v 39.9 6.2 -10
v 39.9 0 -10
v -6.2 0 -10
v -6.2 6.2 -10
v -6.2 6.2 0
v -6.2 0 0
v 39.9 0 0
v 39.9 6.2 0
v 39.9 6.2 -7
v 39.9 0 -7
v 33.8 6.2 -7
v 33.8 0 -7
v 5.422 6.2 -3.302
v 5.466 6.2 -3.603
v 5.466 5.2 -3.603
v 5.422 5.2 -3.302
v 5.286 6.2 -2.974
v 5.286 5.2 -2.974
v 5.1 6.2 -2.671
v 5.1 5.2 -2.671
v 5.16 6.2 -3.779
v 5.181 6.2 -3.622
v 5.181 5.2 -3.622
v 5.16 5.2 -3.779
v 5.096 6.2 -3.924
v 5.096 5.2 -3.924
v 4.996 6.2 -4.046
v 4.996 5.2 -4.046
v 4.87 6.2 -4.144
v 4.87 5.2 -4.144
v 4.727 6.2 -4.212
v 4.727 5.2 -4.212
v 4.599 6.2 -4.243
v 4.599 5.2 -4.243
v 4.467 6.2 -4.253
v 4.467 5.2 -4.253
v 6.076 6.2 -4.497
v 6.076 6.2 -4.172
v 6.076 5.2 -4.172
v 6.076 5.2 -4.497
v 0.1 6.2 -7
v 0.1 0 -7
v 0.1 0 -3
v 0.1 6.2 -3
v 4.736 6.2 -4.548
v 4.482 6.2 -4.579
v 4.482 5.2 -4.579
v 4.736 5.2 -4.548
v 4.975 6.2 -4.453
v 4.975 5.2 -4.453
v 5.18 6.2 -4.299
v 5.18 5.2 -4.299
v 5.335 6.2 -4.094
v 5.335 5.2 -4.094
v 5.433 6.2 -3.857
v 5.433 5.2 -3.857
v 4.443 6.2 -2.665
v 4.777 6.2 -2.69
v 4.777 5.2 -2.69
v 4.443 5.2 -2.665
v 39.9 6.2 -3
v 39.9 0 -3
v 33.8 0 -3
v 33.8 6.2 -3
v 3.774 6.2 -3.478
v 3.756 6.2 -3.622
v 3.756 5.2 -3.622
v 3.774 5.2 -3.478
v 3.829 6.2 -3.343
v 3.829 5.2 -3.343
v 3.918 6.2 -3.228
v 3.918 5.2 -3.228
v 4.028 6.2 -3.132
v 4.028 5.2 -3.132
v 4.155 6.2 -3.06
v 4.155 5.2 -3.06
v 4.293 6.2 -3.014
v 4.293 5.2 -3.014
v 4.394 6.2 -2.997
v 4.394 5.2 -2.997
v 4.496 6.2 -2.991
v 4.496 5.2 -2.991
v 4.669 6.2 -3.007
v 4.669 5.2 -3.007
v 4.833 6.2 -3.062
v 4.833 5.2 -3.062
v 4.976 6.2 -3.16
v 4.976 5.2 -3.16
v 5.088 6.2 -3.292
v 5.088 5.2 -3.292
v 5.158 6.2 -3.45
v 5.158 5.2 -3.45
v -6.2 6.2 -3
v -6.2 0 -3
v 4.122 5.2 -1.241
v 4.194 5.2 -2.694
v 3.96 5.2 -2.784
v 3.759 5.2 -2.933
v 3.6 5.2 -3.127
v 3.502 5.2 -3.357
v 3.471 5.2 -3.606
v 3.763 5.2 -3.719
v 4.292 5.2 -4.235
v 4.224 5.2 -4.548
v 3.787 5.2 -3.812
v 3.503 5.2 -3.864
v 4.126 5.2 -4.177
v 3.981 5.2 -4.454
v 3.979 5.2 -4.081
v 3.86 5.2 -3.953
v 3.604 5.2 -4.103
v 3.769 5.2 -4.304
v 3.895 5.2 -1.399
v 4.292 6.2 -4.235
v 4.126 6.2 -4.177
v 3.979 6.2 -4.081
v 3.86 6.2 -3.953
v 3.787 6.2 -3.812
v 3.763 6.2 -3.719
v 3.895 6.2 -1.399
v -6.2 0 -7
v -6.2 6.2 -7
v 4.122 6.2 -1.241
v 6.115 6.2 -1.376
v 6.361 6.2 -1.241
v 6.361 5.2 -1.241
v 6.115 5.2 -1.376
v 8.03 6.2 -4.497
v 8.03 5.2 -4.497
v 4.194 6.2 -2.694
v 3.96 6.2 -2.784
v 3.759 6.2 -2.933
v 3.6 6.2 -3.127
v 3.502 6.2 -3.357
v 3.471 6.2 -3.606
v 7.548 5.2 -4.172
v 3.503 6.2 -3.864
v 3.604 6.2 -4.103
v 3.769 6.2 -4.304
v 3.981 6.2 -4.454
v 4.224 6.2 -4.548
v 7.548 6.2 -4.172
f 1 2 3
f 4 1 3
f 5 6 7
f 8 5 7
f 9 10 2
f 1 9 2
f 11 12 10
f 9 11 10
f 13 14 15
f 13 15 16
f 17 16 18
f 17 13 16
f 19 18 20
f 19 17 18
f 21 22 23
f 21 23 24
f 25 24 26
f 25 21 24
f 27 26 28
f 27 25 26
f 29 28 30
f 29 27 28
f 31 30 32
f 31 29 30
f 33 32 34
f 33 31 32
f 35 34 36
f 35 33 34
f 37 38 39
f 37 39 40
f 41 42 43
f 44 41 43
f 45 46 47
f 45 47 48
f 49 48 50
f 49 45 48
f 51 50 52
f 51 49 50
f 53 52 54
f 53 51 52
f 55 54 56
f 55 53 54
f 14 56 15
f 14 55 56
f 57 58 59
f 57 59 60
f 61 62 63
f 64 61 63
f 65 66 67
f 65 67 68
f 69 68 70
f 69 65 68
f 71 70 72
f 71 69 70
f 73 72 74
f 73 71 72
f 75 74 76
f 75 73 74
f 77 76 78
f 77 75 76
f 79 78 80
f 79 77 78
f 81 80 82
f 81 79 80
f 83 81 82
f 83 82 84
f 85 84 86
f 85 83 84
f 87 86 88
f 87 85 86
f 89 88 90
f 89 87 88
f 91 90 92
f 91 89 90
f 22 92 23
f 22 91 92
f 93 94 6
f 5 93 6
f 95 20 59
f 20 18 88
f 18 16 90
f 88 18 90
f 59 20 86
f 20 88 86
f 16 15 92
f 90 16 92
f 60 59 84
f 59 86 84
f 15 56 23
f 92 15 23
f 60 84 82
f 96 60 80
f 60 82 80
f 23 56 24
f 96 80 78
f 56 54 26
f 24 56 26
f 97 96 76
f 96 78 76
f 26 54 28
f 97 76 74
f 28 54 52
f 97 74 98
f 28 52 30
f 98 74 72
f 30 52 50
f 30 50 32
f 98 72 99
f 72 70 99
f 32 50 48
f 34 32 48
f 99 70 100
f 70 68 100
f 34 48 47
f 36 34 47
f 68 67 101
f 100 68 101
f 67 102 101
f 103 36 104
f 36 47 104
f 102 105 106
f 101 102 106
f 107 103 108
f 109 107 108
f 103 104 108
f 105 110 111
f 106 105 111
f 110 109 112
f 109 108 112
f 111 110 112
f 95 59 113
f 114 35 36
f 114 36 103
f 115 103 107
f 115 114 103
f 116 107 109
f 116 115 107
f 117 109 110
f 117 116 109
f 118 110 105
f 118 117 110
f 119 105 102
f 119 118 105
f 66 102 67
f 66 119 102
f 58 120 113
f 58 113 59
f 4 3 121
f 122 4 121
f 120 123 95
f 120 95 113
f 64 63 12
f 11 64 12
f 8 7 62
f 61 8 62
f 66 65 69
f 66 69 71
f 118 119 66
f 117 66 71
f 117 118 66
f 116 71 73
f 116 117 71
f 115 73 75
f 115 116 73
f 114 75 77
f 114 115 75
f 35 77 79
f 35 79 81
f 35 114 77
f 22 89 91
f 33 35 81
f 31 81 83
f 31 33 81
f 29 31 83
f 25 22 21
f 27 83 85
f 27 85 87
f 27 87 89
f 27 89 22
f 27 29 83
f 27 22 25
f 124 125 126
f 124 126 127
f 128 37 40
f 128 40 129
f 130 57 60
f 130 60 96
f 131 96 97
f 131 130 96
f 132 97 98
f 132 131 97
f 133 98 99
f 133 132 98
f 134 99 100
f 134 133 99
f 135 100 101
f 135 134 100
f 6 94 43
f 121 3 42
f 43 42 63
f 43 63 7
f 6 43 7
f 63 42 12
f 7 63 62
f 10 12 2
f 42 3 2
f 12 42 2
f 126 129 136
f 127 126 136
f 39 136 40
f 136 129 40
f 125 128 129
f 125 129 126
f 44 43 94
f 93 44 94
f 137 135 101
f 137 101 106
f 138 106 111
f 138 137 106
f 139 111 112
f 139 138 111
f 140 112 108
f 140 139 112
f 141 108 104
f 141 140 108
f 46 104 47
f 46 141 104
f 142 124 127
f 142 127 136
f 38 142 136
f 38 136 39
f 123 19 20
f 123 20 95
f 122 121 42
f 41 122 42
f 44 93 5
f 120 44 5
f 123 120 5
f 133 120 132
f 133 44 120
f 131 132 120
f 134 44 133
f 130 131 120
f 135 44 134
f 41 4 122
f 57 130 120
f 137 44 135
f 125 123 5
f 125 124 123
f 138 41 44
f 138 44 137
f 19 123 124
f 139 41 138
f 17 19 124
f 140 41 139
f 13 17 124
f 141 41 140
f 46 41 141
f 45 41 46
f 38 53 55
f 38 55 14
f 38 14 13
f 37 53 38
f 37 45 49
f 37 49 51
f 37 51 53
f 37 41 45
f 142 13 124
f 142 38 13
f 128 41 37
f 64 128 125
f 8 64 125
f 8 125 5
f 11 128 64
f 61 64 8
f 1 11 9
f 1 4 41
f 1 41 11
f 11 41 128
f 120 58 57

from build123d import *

# Parameters (mm, degrees)
BOSS_EXTRUDE1_DEPTH = 6.2
CUT_EXTRUDE1_DEPTH  = 1


with BuildPart() as part:
    # Sketch1 → Boss-Extrude1 (new body)
    with BuildSketch(Plane(origin=(0, 0, 0), x_dir=(1, 0, 0), z_dir=(0, 1, 0))):
        Polygon((0, 0), (33.7, 0), (39.9, 0), (39.9, 3), (33.8, 3), (33.8, 7), (39.9, 7), (39.9, 10), (33.7, 10), (0, 10), (-6.2, 10), (-6.2, 7), (0.1, 7), (0.1, 3), (-6.2, 3), (-6.2, 0), align=None)
    extrude(amount=BOSS_EXTRUDE1_DEPTH)

    # Sketch2 → Cut-Extrude1 (cut)
    with BuildSketch(Plane(origin=(0, 6.2, 0), x_dir=(1, 0, 0), z_dir=(0, 1, 0))):
        with BuildLine():
            Line((4.122268508, 1.240803577), (3.894574197, 1.399171966))
            Line((3.894574197, 1.399171966), (4.777366665, 2.689651734))
            add(Edge.make_bspline(
                [(4.777366665, 2.689651734), (4.721041498, 2.682763741), (4.610134103, 2.669200898), (4.498431161, 2.66670929), (4.443457411, 2.665483064)],
                knots=[0, 0, 0, 0, 0.000170115, 0.000334967, 0.000334967, 0.000334967, 0.000334967], degree=3))
            add(Edge.make_bspline(
                [(4.443457411, 2.665483064), (4.410127124, 2.666336755), (4.344702687, 2.668012475), (4.248516831, 2.681294687), (4.156092072, 2.701750875), (4.067673442, 2.732275102), (3.982928606, 2.770210192), (3.902042566, 2.817251911), (3.825124208, 2.872593333), (3.752999629, 2.935941833), (3.687402552, 3.00549978), (3.628961417, 3.079119542), (3.580391962, 3.157656315), (3.540045345, 3.239508014), (3.509447005, 3.325851097), (3.487165275, 3.415703053), (3.473447139, 3.509693614), (3.471815102, 3.573669982), (3.470986457, 3.606153136)],
                knots=[0, 0, 0, 0, 9.9954e-05, 0.000196201, 0.000290782, 0.000383503, 0.000476303, 0.000568919, 0.000663705, 0.000760153, 0.000856434, 0.000950205, 0.001041624, 0.001132931, 0.001223461, 0.001315861, 0.001410305, 0.001507717, 0.001507717, 0.001507717, 0.001507717], degree=3))
            add(Edge.make_bspline(
                [(3.470986457, 3.606153136), (3.472559837, 3.6505747), (3.475648063, 3.737765218), (3.500502432, 3.865158708), (3.541378597, 3.985615073), (3.598372911, 4.098817606), (3.670159408, 4.203137891), (3.756436486, 4.2971257), (3.856679368, 4.379444246), (3.968604485, 4.450205088), (4.089574726, 4.507114693), (4.216274151, 4.549060344), (4.34773196, 4.573733494), (4.436784061, 4.576986382), (4.481618468, 4.57862409)],
                knots=[0, 0, 0, 0, 0.000133185, 0.000261414, 0.000387724, 0.00051373, 0.000640399, 0.00076644, 0.000895188, 0.001028407, 0.001162697, 0.001295241, 0.001427846, 0.0015623, 0.0015623, 0.0015623, 0.0015623], degree=3))
            add(Edge.make_bspline(
                [(4.481618468, 4.57862409), (4.525604392, 4.57696387), (4.612516431, 4.573683434), (4.740322887, 4.54965869), (4.862733666, 4.509166851), (4.97907019, 4.45321014), (5.0867838, 4.383069031), (5.183644714, 4.299489856), (5.267442525, 4.202420556), (5.338039902, 4.094208854), (5.394709153, 3.977943093), (5.435596152, 3.856581963), (5.460765411, 3.730998266), (5.463937079, 3.645913279), (5.465537739, 3.602973048)],
                knots=[0, 0, 0, 0, 0.000131915, 0.000260652, 0.000388569, 0.000517718, 0.000646848, 0.000773094, 0.000900237, 0.001030248, 0.001159674, 0.001287189, 0.001413545, 0.001542287, 0.001542287, 0.001542287, 0.001542287], degree=3))
            add(Edge.make_bspline(
                [(5.465537739, 3.602973048), (5.464468754, 3.569641202), (5.462300585, 3.50203589), (5.447118363, 3.399319794), (5.421337195, 3.294589035), (5.392080297, 3.205941588), (5.363838974, 3.132727494), (5.337258661, 3.074895704), (5.307765493, 3.014025272), (5.273367756, 2.950754473), (5.23639053, 2.884276745), (5.194608186, 2.815258852), (5.148973846, 2.74360818), (5.116471172, 2.695305464), (5.099827603, 2.670571205)],
                knots=[0, 0, 0, 0, 9.9984e-05, 0.000202793, 0.000310776, 0.000423207, 0.000482616, 0.000546097, 0.000614079, 0.0006855, 0.000762103, 0.000842274, 0.000927493, 0.001016928, 0.001016928, 0.001016928, 0.001016928], degree=3))
            Line((5.099827603, 2.670571205), (4.122268508, 1.240803577))
        make_face()
        with BuildLine():
            add(Edge.make_bspline(
                [(4.496246874, 2.99112409), (4.521496301, 2.991813867), (4.570648352, 2.993156627), (4.642654901, 3.001329297), (4.710621857, 3.015819984), (4.774730776, 3.036611437), (4.835624466, 3.061699987), (4.892335707, 3.093642288), (4.944911961, 3.131757379), (4.993705294, 3.174583607), (5.037034066, 3.222163779), (5.075626672, 3.271963298), (5.108429472, 3.324200765), (5.134340445, 3.379530367), (5.15564431, 3.436605264), (5.170356364, 3.496344572), (5.178506438, 3.558437049), (5.179895795, 3.600617975), (5.180601842, 3.622053577)],
                knots=[0, 0, 0, 0, 7.5753e-05, 0.000147465, 0.000217073, 0.000283852, 0.000349411, 0.000414338, 0.000478589, 0.000543925, 0.000608743, 0.000671332, 0.000732749, 0.000793345, 0.000854313, 0.000915245, 0.00097749, 0.001041807, 0.001041807, 0.001041807, 0.001041807], degree=3))
            add(Edge.make_bspline(
                [(5.180601842, 3.622053577), (5.179994356, 3.64349813), (5.178797231, 3.685757253), (5.169193038, 3.74794166), (5.1522973, 3.807534833), (5.12962736, 3.864863023), (5.099764001, 3.919455217), (5.063928697, 3.971996815), (5.02135426, 4.022154674), (4.972366218, 4.068749145), (4.919539159, 4.111700453), (4.86324142, 4.149606394), (4.803937031, 4.181375622), (4.741987801, 4.207591116), (4.677264656, 4.228048798), (4.609805896, 4.242760265), (4.539270635, 4.250898928), (4.491390468, 4.252279503), (4.466990063, 4.252983064)],
                knots=[0, 0, 0, 0, 6.4316e-05, 0.000126743, 0.000188161, 0.000249812, 0.000311283, 0.000374438, 0.00044032, 0.000508243, 0.00057698, 0.000644365, 0.000711521, 0.0007785, 0.000845884, 0.000914871, 0.00098532, 0.001058531, 0.001058531, 0.001058531, 0.001058531], degree=3))
            add(Edge.make_bspline(
                [(4.466990063, 4.252983064), (4.442801867, 4.252278367), (4.395344825, 4.250895757), (4.325436623, 4.242775735), (4.258433992, 4.22794986), (4.193898379, 4.207600592), (4.13195099, 4.181373666), (4.072649399, 4.149604729), (4.016338491, 4.111709179), (3.96356208, 4.06871535), (3.914487536, 4.022371556), (3.872645092, 3.971777089), (3.836727776, 3.919482549), (3.806905452, 3.864855759), (3.784224597, 3.807536771), (3.767331781, 3.747941135), (3.757726803, 3.68575739), (3.756529786, 3.643498177), (3.755922355, 3.622053577)],
                knots=[0, 0, 0, 0, 7.2576e-05, 0.000142393, 0.000210758, 0.000278143, 0.000345121, 0.000412278, 0.000479663, 0.0005484, 0.000616323, 0.000681795, 0.00074495, 0.000806421, 0.000868072, 0.00092949, 0.000991917, 0.001056233, 0.001056233, 0.001056233, 0.001056233], degree=3))
            add(Edge.make_bspline(
                [(3.755922355, 3.622053577), (3.756472016, 3.600601282), (3.757556049, 3.558293431), (3.768013401, 3.496130203), (3.785501555, 3.436541627), (3.808923431, 3.3789483), (3.839767731, 3.323910258), (3.877617221, 3.271688436), (3.921981538, 3.221690849), (3.97226763, 3.174694307), (4.027302319, 3.131557691), (4.086082225, 3.093883702), (4.147595434, 3.062067984), (4.212058485, 3.036539729), (4.278993653, 3.01602772), (4.349002522, 3.001356004), (4.421853566, 2.993235019), (4.471211193, 2.991834484), (4.496246874, 2.99112409)],
                knots=[0, 0, 0, 0, 6.4316e-05, 0.000126844, 0.000188436, 0.000250326, 0.000312966, 0.000377217, 0.000443451, 0.000513196, 0.000583426, 0.000652939, 0.000722346, 0.000790847, 0.000860662, 0.000932137, 0.001005113, 0.00108023, 0.00108023, 0.00108023, 0.00108023], degree=3))
        make_face(mode=Mode.SUBTRACT)
        Polygon((6.076114662, 4.497213833), (8.029960816, 4.497213833), (6.36105056, 1.240803577), (6.114911738, 1.376275332), (7.547859454, 4.171572808), (6.076114662, 4.171572808), align=None)
    extrude(amount=-CUT_EXTRUDE1_DEPTH, mode=Mode.SUBTRACT)


solid = part.part
